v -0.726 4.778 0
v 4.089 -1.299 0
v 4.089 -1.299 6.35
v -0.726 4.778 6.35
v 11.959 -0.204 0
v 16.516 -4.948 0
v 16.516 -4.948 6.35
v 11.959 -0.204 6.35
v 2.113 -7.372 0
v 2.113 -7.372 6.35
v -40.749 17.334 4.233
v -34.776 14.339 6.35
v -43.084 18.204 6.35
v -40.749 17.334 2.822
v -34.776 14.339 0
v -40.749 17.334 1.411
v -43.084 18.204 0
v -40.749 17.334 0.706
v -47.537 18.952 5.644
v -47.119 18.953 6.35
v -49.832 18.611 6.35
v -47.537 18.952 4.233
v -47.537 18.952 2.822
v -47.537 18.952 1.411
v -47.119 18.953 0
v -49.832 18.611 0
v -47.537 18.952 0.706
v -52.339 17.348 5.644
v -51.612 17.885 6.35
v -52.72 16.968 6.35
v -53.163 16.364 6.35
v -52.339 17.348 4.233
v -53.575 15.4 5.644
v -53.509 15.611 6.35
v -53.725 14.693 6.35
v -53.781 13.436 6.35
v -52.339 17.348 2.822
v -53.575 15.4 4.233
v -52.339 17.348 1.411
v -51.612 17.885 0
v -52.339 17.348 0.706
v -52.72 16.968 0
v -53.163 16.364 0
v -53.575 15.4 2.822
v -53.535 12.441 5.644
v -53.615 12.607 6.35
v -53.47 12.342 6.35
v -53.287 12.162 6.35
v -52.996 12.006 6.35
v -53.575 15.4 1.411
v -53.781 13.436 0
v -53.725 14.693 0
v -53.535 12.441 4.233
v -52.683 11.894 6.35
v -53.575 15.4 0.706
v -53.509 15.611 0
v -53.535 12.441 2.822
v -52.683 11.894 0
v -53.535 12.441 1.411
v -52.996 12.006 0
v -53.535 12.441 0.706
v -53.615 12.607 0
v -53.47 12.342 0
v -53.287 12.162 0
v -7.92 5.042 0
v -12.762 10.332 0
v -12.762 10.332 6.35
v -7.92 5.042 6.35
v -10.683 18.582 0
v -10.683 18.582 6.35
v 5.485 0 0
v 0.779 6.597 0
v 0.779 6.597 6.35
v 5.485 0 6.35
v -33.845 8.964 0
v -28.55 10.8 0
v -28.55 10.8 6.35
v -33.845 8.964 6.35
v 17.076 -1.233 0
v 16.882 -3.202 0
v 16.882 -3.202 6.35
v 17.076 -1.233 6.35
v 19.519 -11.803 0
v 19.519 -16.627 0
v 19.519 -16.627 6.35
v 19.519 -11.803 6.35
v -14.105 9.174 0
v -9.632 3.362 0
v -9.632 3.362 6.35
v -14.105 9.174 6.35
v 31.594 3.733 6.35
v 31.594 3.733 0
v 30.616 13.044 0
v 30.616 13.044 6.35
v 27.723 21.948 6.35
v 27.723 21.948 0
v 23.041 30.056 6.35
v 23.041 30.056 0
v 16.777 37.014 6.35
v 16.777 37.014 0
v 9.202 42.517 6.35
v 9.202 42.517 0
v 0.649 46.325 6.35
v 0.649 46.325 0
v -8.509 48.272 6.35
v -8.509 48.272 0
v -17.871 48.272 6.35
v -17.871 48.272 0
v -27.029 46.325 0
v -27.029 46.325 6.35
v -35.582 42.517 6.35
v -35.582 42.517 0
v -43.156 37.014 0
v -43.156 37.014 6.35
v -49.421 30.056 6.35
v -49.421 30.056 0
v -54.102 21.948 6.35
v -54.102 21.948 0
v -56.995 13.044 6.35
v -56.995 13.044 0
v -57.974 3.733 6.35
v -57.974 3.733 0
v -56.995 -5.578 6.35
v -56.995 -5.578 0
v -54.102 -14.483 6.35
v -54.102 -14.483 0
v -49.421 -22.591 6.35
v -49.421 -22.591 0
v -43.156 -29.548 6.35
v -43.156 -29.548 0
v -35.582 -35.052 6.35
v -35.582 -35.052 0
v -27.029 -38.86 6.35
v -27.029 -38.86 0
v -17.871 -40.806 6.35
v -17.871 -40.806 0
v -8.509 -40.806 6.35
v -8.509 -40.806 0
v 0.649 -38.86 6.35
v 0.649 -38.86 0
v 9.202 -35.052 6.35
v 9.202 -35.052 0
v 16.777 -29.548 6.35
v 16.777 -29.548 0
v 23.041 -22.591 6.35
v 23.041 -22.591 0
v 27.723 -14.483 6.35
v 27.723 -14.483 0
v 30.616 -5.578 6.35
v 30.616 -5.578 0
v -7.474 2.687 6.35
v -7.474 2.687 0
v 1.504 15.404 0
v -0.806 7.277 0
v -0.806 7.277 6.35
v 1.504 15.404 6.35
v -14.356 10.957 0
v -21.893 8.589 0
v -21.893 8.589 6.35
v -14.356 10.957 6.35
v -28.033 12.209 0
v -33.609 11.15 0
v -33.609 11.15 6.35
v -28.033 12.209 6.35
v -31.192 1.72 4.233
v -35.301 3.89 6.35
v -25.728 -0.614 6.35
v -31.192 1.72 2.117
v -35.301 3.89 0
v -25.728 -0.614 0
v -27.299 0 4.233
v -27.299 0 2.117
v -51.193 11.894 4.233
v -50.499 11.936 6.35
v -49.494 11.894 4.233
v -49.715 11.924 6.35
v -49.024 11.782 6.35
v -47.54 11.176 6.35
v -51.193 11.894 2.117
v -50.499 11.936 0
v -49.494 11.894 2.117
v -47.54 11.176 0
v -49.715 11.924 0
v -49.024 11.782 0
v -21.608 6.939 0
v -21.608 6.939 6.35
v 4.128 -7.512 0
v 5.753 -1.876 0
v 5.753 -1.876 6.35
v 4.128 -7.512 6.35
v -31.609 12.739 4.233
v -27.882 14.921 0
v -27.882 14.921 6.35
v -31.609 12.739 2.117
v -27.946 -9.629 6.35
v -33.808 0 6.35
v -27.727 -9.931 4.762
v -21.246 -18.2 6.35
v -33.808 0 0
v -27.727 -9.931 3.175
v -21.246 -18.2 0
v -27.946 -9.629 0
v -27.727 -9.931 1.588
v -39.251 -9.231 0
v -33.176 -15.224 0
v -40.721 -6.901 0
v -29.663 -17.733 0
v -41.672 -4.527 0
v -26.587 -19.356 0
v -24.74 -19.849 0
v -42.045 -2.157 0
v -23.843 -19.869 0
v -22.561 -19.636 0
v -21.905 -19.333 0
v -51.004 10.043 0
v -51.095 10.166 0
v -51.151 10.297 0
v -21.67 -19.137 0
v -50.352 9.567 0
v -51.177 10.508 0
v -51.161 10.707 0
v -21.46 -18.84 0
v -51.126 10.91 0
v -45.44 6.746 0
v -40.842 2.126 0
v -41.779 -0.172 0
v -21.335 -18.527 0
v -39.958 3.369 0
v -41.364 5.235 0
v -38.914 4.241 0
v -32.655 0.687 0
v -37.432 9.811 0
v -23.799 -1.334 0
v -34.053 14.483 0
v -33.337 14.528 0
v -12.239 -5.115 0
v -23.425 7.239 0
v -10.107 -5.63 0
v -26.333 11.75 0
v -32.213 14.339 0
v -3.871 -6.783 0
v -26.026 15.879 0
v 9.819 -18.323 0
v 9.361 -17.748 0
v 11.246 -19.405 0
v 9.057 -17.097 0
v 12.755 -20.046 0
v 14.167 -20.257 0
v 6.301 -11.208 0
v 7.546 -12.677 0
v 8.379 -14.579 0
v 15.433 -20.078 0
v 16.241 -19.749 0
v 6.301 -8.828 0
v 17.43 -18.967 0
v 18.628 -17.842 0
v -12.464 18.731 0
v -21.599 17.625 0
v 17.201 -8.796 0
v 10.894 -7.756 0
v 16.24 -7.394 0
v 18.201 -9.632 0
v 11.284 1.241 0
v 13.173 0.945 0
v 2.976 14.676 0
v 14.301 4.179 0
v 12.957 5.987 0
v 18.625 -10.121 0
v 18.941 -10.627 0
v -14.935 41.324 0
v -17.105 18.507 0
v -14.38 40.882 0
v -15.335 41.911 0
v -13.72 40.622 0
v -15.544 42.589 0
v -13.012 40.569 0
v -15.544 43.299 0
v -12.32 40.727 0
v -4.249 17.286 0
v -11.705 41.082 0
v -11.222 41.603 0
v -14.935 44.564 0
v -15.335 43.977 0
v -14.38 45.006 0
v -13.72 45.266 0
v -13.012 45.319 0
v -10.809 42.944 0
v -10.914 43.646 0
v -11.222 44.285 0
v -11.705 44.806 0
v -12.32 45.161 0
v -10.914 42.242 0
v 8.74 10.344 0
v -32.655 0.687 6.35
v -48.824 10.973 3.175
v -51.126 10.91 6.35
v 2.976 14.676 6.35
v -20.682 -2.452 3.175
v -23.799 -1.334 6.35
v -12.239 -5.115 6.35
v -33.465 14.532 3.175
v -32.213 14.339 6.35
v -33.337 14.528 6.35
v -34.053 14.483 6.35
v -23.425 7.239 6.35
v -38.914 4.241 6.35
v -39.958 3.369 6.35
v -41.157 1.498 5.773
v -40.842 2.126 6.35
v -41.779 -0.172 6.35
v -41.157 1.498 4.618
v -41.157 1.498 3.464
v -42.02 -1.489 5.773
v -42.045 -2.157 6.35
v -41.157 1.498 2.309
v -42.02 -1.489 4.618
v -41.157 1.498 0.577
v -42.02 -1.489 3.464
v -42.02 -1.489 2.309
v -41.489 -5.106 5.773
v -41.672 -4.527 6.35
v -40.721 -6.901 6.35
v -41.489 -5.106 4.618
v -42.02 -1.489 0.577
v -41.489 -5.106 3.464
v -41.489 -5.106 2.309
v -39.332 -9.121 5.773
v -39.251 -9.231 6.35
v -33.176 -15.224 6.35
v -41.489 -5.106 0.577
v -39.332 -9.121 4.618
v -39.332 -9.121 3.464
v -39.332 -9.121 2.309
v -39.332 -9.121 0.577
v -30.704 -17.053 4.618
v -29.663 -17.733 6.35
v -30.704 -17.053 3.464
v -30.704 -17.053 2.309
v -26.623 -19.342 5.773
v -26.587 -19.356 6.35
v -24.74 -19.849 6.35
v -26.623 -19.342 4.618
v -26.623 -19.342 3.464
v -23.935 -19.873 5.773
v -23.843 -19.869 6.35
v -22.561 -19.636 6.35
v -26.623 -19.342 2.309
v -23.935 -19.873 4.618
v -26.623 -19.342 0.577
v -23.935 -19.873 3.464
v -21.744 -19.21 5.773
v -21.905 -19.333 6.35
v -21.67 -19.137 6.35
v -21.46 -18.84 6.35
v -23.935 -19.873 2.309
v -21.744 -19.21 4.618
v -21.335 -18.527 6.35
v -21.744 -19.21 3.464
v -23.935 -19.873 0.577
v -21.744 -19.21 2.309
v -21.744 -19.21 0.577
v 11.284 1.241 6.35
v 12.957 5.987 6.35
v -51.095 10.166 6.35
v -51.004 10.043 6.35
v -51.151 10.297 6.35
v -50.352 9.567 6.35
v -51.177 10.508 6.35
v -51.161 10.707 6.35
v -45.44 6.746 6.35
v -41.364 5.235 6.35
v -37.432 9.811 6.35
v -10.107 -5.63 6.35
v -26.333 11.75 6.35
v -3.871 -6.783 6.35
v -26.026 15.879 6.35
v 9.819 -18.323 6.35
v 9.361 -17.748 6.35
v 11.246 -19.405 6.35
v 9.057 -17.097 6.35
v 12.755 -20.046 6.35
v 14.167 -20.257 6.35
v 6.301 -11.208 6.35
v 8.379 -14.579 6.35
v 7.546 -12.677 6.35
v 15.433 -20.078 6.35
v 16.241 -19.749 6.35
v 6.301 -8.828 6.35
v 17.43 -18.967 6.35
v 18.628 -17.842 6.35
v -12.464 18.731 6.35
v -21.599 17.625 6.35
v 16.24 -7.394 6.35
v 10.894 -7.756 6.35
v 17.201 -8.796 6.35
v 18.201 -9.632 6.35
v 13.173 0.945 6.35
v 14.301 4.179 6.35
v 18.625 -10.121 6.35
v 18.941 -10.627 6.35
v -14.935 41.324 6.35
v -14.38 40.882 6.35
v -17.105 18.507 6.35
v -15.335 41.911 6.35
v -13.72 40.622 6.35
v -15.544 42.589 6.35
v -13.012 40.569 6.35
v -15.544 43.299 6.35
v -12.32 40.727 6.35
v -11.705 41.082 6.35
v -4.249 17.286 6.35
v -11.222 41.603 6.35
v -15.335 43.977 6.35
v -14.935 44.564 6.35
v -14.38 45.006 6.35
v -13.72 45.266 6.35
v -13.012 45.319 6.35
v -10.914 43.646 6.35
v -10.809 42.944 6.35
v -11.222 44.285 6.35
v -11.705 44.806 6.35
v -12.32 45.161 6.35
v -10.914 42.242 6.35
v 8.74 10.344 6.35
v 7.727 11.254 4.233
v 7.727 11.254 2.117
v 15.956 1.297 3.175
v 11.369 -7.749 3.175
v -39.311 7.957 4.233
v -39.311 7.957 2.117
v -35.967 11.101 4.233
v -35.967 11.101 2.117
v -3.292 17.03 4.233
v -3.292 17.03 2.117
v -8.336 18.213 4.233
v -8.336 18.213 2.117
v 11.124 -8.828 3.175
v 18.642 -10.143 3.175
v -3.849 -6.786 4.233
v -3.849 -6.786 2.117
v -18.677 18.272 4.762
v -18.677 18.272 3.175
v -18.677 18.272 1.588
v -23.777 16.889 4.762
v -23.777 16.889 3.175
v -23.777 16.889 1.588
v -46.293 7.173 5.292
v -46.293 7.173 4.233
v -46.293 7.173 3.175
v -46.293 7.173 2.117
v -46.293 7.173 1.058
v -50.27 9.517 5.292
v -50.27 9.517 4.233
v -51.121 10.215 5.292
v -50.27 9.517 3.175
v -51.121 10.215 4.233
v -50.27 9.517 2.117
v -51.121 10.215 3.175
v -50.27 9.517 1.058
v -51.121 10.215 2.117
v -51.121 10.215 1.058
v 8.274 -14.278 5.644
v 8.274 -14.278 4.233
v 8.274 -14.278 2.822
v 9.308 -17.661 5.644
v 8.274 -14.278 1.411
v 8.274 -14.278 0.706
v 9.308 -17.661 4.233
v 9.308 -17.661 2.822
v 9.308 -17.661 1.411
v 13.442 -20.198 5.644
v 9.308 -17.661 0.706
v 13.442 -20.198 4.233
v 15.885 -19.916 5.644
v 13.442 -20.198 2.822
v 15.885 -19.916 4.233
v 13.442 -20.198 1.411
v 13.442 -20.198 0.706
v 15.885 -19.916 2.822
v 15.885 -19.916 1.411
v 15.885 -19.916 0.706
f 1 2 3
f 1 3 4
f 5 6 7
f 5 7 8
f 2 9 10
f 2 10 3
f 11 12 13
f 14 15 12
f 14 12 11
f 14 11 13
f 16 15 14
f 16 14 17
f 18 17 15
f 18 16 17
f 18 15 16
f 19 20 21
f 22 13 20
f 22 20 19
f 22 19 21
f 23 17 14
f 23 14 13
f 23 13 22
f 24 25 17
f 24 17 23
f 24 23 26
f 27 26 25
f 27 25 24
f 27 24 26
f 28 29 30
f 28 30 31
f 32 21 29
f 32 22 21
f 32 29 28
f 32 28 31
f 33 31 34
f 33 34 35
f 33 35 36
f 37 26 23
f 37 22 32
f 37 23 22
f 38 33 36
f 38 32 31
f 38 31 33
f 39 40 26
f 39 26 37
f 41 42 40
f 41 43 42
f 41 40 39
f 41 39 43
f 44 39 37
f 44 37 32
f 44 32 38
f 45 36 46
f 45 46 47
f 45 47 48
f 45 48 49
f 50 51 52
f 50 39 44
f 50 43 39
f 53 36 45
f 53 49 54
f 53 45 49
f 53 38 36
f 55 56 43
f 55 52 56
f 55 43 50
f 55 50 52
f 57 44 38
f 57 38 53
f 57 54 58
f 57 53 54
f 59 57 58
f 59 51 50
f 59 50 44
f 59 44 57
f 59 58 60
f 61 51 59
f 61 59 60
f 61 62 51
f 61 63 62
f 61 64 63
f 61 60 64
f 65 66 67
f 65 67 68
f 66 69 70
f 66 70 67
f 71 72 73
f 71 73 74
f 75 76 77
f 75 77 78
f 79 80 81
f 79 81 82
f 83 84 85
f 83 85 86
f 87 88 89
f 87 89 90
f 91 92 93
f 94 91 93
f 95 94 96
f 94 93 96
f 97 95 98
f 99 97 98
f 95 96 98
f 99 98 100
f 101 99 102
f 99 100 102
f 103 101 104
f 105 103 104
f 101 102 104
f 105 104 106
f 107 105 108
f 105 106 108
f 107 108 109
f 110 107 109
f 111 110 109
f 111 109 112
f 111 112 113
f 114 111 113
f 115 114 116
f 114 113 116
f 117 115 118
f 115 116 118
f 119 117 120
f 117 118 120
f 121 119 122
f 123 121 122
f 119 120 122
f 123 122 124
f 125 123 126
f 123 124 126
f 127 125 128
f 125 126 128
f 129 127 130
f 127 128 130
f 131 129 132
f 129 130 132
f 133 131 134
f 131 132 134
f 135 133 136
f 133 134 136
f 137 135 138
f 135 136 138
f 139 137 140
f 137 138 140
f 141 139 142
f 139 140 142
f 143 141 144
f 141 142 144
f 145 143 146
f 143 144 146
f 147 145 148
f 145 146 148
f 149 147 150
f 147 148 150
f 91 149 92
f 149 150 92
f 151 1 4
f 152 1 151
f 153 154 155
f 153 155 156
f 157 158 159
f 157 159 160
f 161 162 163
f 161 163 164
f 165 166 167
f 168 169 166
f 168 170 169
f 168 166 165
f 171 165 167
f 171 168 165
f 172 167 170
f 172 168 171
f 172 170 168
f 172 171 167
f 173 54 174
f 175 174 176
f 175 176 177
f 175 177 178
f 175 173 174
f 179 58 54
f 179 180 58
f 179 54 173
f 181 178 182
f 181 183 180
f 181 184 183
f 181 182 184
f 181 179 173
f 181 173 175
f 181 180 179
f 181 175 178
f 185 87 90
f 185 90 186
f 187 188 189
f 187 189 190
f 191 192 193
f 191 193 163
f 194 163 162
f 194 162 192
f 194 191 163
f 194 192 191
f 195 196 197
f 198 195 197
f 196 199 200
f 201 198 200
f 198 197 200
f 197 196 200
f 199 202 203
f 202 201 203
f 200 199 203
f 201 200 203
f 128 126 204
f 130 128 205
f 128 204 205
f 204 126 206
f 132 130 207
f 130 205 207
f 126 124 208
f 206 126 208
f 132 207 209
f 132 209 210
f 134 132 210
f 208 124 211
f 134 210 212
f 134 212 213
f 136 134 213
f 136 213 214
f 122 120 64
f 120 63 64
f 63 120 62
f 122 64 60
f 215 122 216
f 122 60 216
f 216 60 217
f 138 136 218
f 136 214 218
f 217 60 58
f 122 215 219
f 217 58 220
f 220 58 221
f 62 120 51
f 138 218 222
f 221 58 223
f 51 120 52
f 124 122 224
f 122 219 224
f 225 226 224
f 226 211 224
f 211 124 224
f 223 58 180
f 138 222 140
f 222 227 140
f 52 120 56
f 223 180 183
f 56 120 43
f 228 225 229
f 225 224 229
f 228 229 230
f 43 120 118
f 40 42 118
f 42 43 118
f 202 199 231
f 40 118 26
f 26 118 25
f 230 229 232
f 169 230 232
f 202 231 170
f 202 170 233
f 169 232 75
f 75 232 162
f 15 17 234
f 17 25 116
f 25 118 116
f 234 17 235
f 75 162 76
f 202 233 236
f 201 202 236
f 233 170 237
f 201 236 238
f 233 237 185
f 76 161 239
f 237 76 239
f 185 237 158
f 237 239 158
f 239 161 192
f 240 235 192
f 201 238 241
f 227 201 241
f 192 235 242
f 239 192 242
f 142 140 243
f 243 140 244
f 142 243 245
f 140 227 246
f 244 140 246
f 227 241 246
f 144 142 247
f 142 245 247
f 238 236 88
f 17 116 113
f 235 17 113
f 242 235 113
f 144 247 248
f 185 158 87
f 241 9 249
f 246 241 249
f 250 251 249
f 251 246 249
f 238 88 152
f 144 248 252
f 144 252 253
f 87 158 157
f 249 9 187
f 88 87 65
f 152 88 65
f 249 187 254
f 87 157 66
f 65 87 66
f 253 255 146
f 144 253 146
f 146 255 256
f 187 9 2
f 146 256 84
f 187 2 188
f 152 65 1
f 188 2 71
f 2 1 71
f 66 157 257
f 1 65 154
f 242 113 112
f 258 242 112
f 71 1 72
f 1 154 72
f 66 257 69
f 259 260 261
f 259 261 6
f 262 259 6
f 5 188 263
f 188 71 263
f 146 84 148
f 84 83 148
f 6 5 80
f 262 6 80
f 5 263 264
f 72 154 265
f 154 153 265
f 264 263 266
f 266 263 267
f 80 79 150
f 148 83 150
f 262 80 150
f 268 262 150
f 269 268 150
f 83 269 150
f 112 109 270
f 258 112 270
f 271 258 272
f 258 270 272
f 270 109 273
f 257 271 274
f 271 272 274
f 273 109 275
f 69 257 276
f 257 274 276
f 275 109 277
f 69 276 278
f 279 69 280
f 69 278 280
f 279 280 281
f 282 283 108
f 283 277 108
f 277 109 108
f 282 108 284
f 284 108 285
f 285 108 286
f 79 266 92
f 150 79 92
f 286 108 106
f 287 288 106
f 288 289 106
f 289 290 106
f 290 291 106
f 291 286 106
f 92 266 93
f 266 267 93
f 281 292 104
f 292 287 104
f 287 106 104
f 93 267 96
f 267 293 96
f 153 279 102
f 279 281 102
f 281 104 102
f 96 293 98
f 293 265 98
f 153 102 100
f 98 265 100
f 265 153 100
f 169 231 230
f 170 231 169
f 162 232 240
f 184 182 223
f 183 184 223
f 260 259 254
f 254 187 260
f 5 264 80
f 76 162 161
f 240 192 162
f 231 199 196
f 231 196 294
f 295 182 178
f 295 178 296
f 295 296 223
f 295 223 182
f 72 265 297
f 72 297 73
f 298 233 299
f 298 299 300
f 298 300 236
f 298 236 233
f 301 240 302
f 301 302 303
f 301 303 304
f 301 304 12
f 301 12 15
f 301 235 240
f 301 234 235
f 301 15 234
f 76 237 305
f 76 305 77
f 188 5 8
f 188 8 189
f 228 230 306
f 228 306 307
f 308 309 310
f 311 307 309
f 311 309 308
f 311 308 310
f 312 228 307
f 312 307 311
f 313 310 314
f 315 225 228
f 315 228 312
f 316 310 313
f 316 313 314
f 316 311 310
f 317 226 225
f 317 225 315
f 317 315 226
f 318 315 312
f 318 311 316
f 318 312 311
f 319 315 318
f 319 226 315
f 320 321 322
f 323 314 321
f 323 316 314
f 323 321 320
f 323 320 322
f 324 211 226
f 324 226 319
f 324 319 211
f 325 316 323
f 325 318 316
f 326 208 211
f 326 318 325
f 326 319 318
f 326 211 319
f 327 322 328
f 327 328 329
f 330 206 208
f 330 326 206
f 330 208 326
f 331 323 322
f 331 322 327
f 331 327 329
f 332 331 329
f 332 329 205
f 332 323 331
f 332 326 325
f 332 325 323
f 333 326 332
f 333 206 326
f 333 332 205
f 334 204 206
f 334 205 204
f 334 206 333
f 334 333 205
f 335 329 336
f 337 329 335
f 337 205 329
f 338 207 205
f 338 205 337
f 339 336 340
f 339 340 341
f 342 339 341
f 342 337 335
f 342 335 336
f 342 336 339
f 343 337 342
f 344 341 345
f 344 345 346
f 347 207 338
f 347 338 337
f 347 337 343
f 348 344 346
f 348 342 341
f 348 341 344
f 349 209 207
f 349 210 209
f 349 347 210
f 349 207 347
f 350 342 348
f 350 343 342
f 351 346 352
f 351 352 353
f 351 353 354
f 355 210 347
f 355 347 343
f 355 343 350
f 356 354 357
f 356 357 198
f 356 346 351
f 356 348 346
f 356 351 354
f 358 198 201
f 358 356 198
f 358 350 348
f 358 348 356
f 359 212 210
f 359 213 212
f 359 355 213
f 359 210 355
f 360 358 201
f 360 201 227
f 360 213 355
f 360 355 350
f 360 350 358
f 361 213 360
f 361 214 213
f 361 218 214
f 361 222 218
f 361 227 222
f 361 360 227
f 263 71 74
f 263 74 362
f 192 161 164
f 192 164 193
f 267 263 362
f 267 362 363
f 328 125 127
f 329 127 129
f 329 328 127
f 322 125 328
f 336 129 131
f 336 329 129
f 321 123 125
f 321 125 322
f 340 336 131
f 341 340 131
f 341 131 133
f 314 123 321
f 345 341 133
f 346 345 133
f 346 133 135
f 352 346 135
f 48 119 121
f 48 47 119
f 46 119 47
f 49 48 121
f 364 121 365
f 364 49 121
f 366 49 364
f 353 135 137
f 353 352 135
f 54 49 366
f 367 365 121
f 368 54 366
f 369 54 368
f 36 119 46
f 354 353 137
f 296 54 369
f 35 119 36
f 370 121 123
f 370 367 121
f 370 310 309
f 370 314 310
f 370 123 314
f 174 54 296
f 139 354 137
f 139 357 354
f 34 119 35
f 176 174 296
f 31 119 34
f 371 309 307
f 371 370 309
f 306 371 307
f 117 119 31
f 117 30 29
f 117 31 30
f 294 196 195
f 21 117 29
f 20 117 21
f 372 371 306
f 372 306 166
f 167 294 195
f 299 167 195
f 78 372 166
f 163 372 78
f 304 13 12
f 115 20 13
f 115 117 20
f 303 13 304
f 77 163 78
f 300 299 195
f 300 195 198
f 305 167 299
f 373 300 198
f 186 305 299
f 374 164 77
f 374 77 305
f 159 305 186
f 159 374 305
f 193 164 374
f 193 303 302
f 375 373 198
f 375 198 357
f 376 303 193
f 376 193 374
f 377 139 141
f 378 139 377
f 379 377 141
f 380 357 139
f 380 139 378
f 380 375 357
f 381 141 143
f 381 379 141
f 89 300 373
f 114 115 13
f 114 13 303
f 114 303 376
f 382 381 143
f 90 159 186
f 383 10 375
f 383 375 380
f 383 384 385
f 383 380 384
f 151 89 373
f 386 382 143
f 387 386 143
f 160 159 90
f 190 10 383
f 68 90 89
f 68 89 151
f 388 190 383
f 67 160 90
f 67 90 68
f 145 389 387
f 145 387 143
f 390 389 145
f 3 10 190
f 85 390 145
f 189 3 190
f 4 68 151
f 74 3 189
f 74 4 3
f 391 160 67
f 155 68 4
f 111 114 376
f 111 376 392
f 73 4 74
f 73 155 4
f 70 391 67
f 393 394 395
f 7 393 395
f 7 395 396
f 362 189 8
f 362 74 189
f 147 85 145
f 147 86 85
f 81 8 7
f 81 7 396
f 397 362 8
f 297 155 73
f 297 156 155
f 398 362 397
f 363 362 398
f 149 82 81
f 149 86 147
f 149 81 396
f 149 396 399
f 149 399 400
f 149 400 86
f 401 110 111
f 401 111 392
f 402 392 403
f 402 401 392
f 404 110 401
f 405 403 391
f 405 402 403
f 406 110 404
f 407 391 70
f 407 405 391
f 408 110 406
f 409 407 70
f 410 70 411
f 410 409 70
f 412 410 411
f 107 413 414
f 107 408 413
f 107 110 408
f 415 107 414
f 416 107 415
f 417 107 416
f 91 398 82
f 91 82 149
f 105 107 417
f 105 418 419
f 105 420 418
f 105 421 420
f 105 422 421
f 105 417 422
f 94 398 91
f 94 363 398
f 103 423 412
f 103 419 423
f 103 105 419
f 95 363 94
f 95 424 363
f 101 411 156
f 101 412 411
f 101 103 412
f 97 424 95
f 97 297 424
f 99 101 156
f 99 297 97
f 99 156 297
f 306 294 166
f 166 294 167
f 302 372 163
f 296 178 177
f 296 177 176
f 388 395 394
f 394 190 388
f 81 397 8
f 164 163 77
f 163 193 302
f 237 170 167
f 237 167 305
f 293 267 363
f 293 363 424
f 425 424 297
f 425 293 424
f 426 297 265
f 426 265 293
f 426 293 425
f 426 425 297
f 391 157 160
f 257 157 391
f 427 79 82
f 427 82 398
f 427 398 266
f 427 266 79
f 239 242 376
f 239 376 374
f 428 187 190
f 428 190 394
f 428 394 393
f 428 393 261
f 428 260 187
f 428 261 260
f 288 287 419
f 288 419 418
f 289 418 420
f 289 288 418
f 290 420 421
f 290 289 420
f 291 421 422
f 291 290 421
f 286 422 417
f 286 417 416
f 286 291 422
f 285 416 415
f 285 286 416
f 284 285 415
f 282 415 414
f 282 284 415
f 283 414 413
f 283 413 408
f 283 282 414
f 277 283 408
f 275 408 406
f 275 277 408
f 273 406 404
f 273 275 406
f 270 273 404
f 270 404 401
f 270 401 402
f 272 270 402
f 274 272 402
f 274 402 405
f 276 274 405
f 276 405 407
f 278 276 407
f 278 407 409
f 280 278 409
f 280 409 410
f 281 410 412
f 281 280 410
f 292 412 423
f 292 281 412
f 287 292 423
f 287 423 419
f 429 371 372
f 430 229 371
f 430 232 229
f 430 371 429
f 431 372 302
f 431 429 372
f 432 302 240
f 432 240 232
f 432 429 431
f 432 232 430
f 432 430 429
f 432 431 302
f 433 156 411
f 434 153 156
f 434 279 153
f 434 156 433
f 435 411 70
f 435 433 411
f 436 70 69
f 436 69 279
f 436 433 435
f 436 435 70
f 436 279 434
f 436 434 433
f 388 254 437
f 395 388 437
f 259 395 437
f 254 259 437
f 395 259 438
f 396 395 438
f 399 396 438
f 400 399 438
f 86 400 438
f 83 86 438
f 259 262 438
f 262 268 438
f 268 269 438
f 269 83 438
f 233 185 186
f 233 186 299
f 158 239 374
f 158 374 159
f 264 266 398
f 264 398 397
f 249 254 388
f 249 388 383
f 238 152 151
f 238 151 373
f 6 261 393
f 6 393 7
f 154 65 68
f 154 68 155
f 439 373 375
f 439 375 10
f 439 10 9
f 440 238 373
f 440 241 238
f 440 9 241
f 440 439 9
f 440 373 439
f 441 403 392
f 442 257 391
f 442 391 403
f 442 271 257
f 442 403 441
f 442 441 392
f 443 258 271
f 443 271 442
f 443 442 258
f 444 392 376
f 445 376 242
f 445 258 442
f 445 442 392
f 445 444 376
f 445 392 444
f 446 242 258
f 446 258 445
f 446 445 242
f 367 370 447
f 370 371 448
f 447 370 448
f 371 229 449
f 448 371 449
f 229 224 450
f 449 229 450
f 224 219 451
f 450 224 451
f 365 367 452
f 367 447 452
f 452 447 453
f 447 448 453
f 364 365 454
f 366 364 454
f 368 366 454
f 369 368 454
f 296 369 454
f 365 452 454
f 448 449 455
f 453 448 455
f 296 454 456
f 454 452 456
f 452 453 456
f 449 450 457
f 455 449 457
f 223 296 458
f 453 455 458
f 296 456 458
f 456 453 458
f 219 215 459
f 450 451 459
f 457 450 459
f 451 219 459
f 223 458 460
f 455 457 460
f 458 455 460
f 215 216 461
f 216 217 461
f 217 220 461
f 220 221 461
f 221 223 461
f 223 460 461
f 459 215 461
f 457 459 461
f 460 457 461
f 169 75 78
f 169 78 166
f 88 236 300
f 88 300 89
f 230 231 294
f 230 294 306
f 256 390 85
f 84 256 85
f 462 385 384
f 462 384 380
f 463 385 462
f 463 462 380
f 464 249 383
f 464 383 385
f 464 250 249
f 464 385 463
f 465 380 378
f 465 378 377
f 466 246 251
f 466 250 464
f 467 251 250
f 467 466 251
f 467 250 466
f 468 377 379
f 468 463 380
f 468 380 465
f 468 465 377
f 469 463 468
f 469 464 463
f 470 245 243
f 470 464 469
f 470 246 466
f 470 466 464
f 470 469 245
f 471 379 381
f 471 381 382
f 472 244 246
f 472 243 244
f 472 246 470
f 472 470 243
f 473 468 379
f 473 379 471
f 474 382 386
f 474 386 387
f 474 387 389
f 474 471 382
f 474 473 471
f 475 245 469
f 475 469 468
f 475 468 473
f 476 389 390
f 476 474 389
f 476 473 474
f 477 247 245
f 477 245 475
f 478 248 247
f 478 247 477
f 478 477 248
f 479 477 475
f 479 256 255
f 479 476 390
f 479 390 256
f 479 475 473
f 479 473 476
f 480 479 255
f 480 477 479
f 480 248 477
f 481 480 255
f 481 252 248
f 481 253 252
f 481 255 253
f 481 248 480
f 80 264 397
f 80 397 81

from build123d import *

# Parameters (mm, degrees)
F1_R     = 44.7842748313
F1_R_2   = 2.38125
F2_DEPTH = 6.35
F3_DEPTH = 6.35


with BuildPart() as f2:
    # F1 (on Top) → F2 (new body)
    with BuildSketch(Plane.XY):
        with Locations((-13.1898317486, 3.732789075)):
            Circle(F1_R)
        with Locations((-13.1898317486, 42.944039075)):
            Circle(F1_R_2, mode=Mode.SUBTRACT)
    extrude(amount=F2_DEPTH)

    # F0 (on Top) → F3 (cut)
    with BuildSketch(Plane.XY):
        with BuildLine():
            add(Edge.make_bspline(
                [(-12.4636225999, 18.7310151137), (-12.700836517, 18.7418877894), (-14.7135863035, 18.8023957248), (-18.7603399294, 18.3845679597), (-22.775974145, 17.3923678376), (-25.2862051987, 16.2435268296), (-26.0264929384, 15.8794540912)],
                knots=[0.6141005824, 0.6141005824, 0.6141005824, 0.6141005824, 0.6254855246, 0.7099381095, 0.7925903309, 0.8286226548, 0.8286226548, 0.8286226548, 0.8286226548], degree=3))
            Line((-26.0264929384, 15.8794540912), (-26.3334475458, 11.7495246232))
            Line((-26.3334475458, 11.7495246232), (-21.893137177, 8.5887544849))
            Line((-21.893137177, 8.5887544849), (-14.3556036479, 10.9565657624))
            Line((-14.3556036479, 10.9565657624), (-12.4636225999, 18.7310151137))
        make_face()
        with BuildLine():
            add(Edge.make_bspline(
                [(17.0761212754, -1.2330010545), (16.7565687163, -0.4098702464), (16.0841440727, 1.1584941418), (14.9301006836, 3.2251558684), (14.3014379785, 4.1789165057)],
                knots=[0, 0, 0, 0, 0.0598110604, 0.1186804231, 0.1186804231, 0.1186804231, 0.1186804231], degree=3))
            Line((14.3014379785, 4.1789165057), (13.1734283641, 0.945114065))
            Line((13.1734283641, 0.945114065), (16.8822035193, -3.2017137855))
            Line((16.8822035193, -3.2017137855), (17.0761212754, -1.2330010545))
        make_face()
        with BuildLine():
            add(Edge.make_bspline(
                [(12.9573335188, 5.9873126243), (12.4171771372, 6.6347228027), (10.8672510982, 8.290991133), (7.8508623493, 11.2981513086), (4.7171014761, 13.7171177928), (2.9755457903, 14.6763748975)],
                knots=[0.1586257044, 0.1586257044, 0.1586257044, 0.1586257044, 0.2046754286, 0.2841137082, 0.3678161589, 0.3678161589, 0.3678161589, 0.3678161589], degree=3))
            Line((2.9755457903, 14.6763748975), (0.778891387, 6.5971535568))
            Line((0.778891387, 6.5971535568), (5.4848841392, 0))
            Line((5.4848841392, 0), (11.2836286426, 1.2413795339))
            Line((11.2836286426, 1.2413795339), (12.9573335188, 5.9873126243))
        make_face()
        with BuildLine():
            add(Edge.make_bspline(
                [(1.504048135, 15.4042947127), (-0.0766035801, 16.1048318034), (-3.5615202087, 17.1547327217), (-7.4874623555, 18.0932850112), (-9.89481672, 18.4878328234), (-10.683314516, 18.5819561221)],
                knots=[0.3909411161, 0.3909411161, 0.3909411161, 0.3909411161, 0.4642583123, 0.5460985201, 0.5851294693, 0.5851294693, 0.5851294693, 0.5851294693], degree=3))
            Line((-10.683314516, 18.5819561221), (-12.7623995619, 10.3316202048))
            Line((-12.7623995619, 10.3316202048), (-7.9200800361, 5.0423189286))
            Line((-7.9200800361, 5.0423189286), (-0.8055971672, 7.2772346657))
            Line((-0.8055971672, 7.2772346657), (1.504048135, 15.4042947127))
        make_face()
        with BuildLine():
            Line((-28.0327834189, 12.2094918042), (-27.881822642, 14.9205854165))
            add(Edge.make_bspline(
                [(-27.881822642, 14.9205854165), (-28.2235984259, 14.7368686239), (-29.707609051, 13.9252516802), (-31.5766590749, 12.8684910171), (-32.9867531182, 11.6730302258), (-33.608547909, 11.1504288348)],
                knots=[0.8599178563, 0.8599178563, 0.8599178563, 0.8599178563, 0.8781747617, 0.9425347357, 1, 1, 1, 1], degree=3))
            Line((-33.608547909, 11.1504288348), (-28.0327834189, 12.2094918042))
        make_face()
        with BuildLine():
            add(Edge.make_bspline(
                [(-35.3008805327, 3.8896822618), (-33.9704748288, 3.1064963082), (-31.1387424935, 1.6503241949), (-28.353403972, 0.4057732276), (-26.2797724128, -0.4034163963), (-25.728418345, -0.6138060248)],
                knots=[0, 0, 0, 0, 0.1053304793, 0.2061480666, 0.2404097116, 0.2404097116, 0.2404097116, 0.2404097116], degree=3))
            Line((-25.728418345, -0.6138060248), (-23.4248191118, 7.2388863191))
            Line((-23.4248191118, 7.2388863191), (-28.5499040037, 10.8002331108))
            Line((-28.5499040037, 10.8002331108), (-33.8448248804, 8.9644929394))
            Line((-33.8448248804, 8.9644929394), (-35.3008805327, 3.8896822618))
        make_face()
        with BuildLine():
            add(Edge.make_bspline(
                [(-23.7994689588, -1.334122404), (-22.7970479228, -1.7014796604), (-19.0825350613, -3.0299135458), (-15.1942067235, -4.3505276851), (-12.2387969281, -5.1150762315)],
                knots=[0.2786134922, 0.2786134922, 0.2786134922, 0.2786134922, 0.3359614616, 0.4813572535, 0.4813572535, 0.4813572535, 0.4813572535], degree=3))
            Line((-12.2387969281, -5.1150762315), (-9.6320642252, 3.3620366375))
            Line((-9.6320642252, 3.3620366375), (-14.1047621146, 9.1740069911))
            Line((-14.1047621146, 9.1740069911), (-21.6079887096, 6.9390815697))
            Line((-21.6079887096, 6.9390815697), (-23.7994689588, -1.334122404))
        make_face()
        with BuildLine():
            add(Edge.make_bspline(
                [(-10.1074330979, -5.6301461927), (-7.8838890977, -6.1321072555), (-3.3049014366, -6.9491400303), (-0.2649070352, -7.1988283349), (2.0166522907, -7.3652342676), (2.113120385, -7.3722353946)],
                knots=[0.516031649, 0.516031649, 0.516031649, 0.516031649, 0.6242815929, 0.7409915354, 0.7460827745, 0.7460827745, 0.7460827745, 0.7460827745], degree=3))
            Line((2.113120385, -7.3722353946), (4.0888668499, -1.2989036668))
            Line((4.0888668499, -1.2989036668), (-0.7256831978, 4.7784783483))
            Line((-0.7256831978, 4.7784783483), (-7.4739452921, 2.6869120148))
            Line((-7.4739452921, 2.6869120148), (-10.1074330979, -5.6301461927))
        make_face()
        with BuildLine():
            Line((5.7529720574, -1.8757634103), (4.1284853727, -7.5115655787))
            add(Edge.make_bspline(
                [(4.1284853727, -7.5115655787), (6.5097684242, -7.665945718), (11.7629659517, -7.9219873243), (15.0828316296, -7.4917859764), (16.24019522, -7.3943839049)],
                knots=[0.7794160343, 0.7794160343, 0.7794160343, 0.7794160343, 0.8920010571, 1, 1, 1, 1], degree=3))
            Line((16.24019522, -7.3943839049), (16.5163930506, -4.9484283663))
            Line((16.5163930506, -4.9484283663), (11.9589660317, -0.2040943073))
            Line((11.9589660317, -0.2040943073), (5.7529720574, -1.8757634103))
        make_face()
        with BuildLine():
            Line((-32.6550118625, 0.6874210667), (-38.9135852456, 4.2410623282))
            add(Edge.make_bspline(
                [(-38.9135852456, 4.2410623282), (-39.3112517031, 3.9451621348), (-40.1742754867, 3.3029935543), (-41.2613500364, 1.4791367195), (-42.321971058, -1.5317468472), (-41.6663887017, -5.2598861304), (-39.4879042834, -9.3338699432), (-35.3735468054, -13.5125766697), (-30.905416529, -17.0785709311), (-26.7597420463, -19.4785196652), (-24.0905644833, -20.0856459639), (-21.5592049478, -19.4493333003), (-21.3372703329, -18.5647019099), (-21.2457757443, -18.2000044733)],
                knots=[0, 0, 0, 0, 0.0623738462, 0.1353649817, 0.2247745052, 0.3217333621, 0.4299962373, 0.5528484965, 0.6758370187, 0.7855399675, 0.8694778278, 0.9461910326, 1, 1, 1, 1], degree=3))
            add(Edge.make_bspline(
                [(-33.8080152869, 0), (-32.9830579575, -1.529225689), (-31.283836878, -4.8000216074), (-27.8309857684, -9.9220057064), (-23.7650458822, -15.1256570893), (-21.9541675402, -17.3470273404), (-21.2457757443, -18.2000044733)],
                knots=[0, 0, 0, 0, 0.2468029362, 0.5150634413, 0.7907795189, 1, 1, 1, 1], degree=3))
            Line((-33.8080152869, 0), (-32.6550118625, 0.6874210667))
        make_face()
        with BuildLine():
            add(Edge.make_bspline(
                [(6.3007003628, -8.8277459145), (7.8622200727, -8.8299373726), (11.1763723681, -8.8345884992), (15.1169332851, -8.8096251255), (17.2008313239, -8.7964236736)],
                knots=[0, 0, 0, 0, 0.4711671555, 1, 1, 1, 1], degree=3))
            Line((6.3007003628, -8.8277459145), (6.3007003628, -11.2082343549))
            add(Edge.make_bspline(
                [(6.3007003628, -11.2082343549), (6.7014254454, -11.6066824346), (7.5303912132, -12.430989231), (8.312055252, -14.2660054753), (8.8388055864, -16.0812743842), (9.1199230788, -17.7821529484), (10.9590739375, -19.409445893), (13.4163914328, -20.3949251118), (15.9619796747, -20.1824186853), (18.3522101245, -18.2781604176), (19.0985659245, -17.2861146766), (19.5186752826, -16.6269782931)],
                knots=[0, 0, 0, 0, 0.0988968998, 0.205226452, 0.309314373, 0.4063223813, 0.5217111764, 0.6441062328, 0.76274352, 0.8910493003, 1, 1, 1, 1], degree=3))
            Line((19.5186752826, -16.6269782931), (19.5186752826, -11.8033559993))
            add(Edge.make_bspline(
                [(17.2008313239, -8.7964236736), (17.6881593659, -9.1290143111), (18.843677078, -10.1380285193), (19.1551034946, -11.1190344132), (19.5186752826, -11.8033559993)],
                knots=[0, 0, 0, 0, 0.5061571176, 1, 1, 1, 1], degree=3))
        make_face()
        with BuildLine():
            add(Edge.make_bspline(
                [(-41.3643307984, 5.2348920144), (-41.8961382705, 5.3688752267), (-43.1634102836, 5.6881508746), (-46.3568318469, 7.131410852), (-48.4357546764, 8.4162333897), (-50.1900228416, 9.471143643), (-51.2728830223, 10.1160479526), (-51.1712652645, 10.6662919797), (-51.1262714863, 10.9099261463)],
                knots=[0, 0, 0, 0, 0.1659730689, 0.3955059607, 0.5923499062, 0.7685248693, 0.8975086548, 1, 1, 1, 1], degree=3))
            add(Edge.make_bspline(
                [(-41.3643307984, 5.2348920144), (-40.743739466, 6.1427040293), (-39.4030800525, 8.1038444125), (-35.922884108, 11.1489637646), (-33.4653668396, 13.2623235425), (-32.2129242122, 14.339370653)],
                knots=[0, 0, 0, 0, 0.297071345, 0.6417612918, 1, 1, 1, 1], degree=3))
            add(Edge.make_bspline(
                [(-32.2129242122, 14.339370653), (-32.6279933844, 14.4347967242), (-33.4674072, 14.6277813345), (-34.3364117984, 14.4362131524), (-34.7757153213, 14.339370653)],
                knots=[0, 0, 0, 0, 0.4944750307, 1, 1, 1, 1], degree=3))
            add(Edge.make_bspline(
                [(-34.7757153213, 14.339370653), (-35.5755514931, 14.7305640489), (-37.3100615282, 15.5934233103), (-40.7301505565, 17.4461191305), (-44.1269962605, 18.5882966714), (-47.4736340278, 19.1687837987), (-50.632913896, 18.4977406021), (-52.4341181464, 17.4397636174), (-53.8428950663, 15.604166228), (-53.8950291683, 12.2393863425), (-53.0032276042, 12.0052395986), (-52.6827611029, 11.893581599)],
                knots=[0, 0, 0, 0, 0.1129134194, 0.2458879424, 0.3743292003, 0.4985841452, 0.6180626356, 0.713486169, 0.8159699873, 0.9320745971, 1, 1, 1, 1], degree=3))
            add(Edge.make_bspline(
                [(-52.6827611029, 11.893581599), (-52.2312250377, 11.8819870556), (-51.1564145101, 11.8524438825), (-49.4733675486, 12.0759187766), (-48.1360060292, 11.4560814996), (-47.5398749113, 11.1761651933)],
                knots=[0, 0, 0, 0, 0.3077409135, 0.6363146276, 1, 1, 1, 1], degree=3))
            add(Edge.make_bspline(
                [(-47.5398749113, 11.1761651933), (-47.9360821494, 11.0971082287), (-48.8595913218, 10.912836401), (-50.3024393349, 10.9109838877), (-51.1262714863, 10.9099261463)],
                knots=[0, 0, 0, 0, 0.4290236089, 1, 1, 1, 1], degree=3))
        make_face()
    extrude(amount=F3_DEPTH, mode=Mode.SUBTRACT)


solid = f2.part
